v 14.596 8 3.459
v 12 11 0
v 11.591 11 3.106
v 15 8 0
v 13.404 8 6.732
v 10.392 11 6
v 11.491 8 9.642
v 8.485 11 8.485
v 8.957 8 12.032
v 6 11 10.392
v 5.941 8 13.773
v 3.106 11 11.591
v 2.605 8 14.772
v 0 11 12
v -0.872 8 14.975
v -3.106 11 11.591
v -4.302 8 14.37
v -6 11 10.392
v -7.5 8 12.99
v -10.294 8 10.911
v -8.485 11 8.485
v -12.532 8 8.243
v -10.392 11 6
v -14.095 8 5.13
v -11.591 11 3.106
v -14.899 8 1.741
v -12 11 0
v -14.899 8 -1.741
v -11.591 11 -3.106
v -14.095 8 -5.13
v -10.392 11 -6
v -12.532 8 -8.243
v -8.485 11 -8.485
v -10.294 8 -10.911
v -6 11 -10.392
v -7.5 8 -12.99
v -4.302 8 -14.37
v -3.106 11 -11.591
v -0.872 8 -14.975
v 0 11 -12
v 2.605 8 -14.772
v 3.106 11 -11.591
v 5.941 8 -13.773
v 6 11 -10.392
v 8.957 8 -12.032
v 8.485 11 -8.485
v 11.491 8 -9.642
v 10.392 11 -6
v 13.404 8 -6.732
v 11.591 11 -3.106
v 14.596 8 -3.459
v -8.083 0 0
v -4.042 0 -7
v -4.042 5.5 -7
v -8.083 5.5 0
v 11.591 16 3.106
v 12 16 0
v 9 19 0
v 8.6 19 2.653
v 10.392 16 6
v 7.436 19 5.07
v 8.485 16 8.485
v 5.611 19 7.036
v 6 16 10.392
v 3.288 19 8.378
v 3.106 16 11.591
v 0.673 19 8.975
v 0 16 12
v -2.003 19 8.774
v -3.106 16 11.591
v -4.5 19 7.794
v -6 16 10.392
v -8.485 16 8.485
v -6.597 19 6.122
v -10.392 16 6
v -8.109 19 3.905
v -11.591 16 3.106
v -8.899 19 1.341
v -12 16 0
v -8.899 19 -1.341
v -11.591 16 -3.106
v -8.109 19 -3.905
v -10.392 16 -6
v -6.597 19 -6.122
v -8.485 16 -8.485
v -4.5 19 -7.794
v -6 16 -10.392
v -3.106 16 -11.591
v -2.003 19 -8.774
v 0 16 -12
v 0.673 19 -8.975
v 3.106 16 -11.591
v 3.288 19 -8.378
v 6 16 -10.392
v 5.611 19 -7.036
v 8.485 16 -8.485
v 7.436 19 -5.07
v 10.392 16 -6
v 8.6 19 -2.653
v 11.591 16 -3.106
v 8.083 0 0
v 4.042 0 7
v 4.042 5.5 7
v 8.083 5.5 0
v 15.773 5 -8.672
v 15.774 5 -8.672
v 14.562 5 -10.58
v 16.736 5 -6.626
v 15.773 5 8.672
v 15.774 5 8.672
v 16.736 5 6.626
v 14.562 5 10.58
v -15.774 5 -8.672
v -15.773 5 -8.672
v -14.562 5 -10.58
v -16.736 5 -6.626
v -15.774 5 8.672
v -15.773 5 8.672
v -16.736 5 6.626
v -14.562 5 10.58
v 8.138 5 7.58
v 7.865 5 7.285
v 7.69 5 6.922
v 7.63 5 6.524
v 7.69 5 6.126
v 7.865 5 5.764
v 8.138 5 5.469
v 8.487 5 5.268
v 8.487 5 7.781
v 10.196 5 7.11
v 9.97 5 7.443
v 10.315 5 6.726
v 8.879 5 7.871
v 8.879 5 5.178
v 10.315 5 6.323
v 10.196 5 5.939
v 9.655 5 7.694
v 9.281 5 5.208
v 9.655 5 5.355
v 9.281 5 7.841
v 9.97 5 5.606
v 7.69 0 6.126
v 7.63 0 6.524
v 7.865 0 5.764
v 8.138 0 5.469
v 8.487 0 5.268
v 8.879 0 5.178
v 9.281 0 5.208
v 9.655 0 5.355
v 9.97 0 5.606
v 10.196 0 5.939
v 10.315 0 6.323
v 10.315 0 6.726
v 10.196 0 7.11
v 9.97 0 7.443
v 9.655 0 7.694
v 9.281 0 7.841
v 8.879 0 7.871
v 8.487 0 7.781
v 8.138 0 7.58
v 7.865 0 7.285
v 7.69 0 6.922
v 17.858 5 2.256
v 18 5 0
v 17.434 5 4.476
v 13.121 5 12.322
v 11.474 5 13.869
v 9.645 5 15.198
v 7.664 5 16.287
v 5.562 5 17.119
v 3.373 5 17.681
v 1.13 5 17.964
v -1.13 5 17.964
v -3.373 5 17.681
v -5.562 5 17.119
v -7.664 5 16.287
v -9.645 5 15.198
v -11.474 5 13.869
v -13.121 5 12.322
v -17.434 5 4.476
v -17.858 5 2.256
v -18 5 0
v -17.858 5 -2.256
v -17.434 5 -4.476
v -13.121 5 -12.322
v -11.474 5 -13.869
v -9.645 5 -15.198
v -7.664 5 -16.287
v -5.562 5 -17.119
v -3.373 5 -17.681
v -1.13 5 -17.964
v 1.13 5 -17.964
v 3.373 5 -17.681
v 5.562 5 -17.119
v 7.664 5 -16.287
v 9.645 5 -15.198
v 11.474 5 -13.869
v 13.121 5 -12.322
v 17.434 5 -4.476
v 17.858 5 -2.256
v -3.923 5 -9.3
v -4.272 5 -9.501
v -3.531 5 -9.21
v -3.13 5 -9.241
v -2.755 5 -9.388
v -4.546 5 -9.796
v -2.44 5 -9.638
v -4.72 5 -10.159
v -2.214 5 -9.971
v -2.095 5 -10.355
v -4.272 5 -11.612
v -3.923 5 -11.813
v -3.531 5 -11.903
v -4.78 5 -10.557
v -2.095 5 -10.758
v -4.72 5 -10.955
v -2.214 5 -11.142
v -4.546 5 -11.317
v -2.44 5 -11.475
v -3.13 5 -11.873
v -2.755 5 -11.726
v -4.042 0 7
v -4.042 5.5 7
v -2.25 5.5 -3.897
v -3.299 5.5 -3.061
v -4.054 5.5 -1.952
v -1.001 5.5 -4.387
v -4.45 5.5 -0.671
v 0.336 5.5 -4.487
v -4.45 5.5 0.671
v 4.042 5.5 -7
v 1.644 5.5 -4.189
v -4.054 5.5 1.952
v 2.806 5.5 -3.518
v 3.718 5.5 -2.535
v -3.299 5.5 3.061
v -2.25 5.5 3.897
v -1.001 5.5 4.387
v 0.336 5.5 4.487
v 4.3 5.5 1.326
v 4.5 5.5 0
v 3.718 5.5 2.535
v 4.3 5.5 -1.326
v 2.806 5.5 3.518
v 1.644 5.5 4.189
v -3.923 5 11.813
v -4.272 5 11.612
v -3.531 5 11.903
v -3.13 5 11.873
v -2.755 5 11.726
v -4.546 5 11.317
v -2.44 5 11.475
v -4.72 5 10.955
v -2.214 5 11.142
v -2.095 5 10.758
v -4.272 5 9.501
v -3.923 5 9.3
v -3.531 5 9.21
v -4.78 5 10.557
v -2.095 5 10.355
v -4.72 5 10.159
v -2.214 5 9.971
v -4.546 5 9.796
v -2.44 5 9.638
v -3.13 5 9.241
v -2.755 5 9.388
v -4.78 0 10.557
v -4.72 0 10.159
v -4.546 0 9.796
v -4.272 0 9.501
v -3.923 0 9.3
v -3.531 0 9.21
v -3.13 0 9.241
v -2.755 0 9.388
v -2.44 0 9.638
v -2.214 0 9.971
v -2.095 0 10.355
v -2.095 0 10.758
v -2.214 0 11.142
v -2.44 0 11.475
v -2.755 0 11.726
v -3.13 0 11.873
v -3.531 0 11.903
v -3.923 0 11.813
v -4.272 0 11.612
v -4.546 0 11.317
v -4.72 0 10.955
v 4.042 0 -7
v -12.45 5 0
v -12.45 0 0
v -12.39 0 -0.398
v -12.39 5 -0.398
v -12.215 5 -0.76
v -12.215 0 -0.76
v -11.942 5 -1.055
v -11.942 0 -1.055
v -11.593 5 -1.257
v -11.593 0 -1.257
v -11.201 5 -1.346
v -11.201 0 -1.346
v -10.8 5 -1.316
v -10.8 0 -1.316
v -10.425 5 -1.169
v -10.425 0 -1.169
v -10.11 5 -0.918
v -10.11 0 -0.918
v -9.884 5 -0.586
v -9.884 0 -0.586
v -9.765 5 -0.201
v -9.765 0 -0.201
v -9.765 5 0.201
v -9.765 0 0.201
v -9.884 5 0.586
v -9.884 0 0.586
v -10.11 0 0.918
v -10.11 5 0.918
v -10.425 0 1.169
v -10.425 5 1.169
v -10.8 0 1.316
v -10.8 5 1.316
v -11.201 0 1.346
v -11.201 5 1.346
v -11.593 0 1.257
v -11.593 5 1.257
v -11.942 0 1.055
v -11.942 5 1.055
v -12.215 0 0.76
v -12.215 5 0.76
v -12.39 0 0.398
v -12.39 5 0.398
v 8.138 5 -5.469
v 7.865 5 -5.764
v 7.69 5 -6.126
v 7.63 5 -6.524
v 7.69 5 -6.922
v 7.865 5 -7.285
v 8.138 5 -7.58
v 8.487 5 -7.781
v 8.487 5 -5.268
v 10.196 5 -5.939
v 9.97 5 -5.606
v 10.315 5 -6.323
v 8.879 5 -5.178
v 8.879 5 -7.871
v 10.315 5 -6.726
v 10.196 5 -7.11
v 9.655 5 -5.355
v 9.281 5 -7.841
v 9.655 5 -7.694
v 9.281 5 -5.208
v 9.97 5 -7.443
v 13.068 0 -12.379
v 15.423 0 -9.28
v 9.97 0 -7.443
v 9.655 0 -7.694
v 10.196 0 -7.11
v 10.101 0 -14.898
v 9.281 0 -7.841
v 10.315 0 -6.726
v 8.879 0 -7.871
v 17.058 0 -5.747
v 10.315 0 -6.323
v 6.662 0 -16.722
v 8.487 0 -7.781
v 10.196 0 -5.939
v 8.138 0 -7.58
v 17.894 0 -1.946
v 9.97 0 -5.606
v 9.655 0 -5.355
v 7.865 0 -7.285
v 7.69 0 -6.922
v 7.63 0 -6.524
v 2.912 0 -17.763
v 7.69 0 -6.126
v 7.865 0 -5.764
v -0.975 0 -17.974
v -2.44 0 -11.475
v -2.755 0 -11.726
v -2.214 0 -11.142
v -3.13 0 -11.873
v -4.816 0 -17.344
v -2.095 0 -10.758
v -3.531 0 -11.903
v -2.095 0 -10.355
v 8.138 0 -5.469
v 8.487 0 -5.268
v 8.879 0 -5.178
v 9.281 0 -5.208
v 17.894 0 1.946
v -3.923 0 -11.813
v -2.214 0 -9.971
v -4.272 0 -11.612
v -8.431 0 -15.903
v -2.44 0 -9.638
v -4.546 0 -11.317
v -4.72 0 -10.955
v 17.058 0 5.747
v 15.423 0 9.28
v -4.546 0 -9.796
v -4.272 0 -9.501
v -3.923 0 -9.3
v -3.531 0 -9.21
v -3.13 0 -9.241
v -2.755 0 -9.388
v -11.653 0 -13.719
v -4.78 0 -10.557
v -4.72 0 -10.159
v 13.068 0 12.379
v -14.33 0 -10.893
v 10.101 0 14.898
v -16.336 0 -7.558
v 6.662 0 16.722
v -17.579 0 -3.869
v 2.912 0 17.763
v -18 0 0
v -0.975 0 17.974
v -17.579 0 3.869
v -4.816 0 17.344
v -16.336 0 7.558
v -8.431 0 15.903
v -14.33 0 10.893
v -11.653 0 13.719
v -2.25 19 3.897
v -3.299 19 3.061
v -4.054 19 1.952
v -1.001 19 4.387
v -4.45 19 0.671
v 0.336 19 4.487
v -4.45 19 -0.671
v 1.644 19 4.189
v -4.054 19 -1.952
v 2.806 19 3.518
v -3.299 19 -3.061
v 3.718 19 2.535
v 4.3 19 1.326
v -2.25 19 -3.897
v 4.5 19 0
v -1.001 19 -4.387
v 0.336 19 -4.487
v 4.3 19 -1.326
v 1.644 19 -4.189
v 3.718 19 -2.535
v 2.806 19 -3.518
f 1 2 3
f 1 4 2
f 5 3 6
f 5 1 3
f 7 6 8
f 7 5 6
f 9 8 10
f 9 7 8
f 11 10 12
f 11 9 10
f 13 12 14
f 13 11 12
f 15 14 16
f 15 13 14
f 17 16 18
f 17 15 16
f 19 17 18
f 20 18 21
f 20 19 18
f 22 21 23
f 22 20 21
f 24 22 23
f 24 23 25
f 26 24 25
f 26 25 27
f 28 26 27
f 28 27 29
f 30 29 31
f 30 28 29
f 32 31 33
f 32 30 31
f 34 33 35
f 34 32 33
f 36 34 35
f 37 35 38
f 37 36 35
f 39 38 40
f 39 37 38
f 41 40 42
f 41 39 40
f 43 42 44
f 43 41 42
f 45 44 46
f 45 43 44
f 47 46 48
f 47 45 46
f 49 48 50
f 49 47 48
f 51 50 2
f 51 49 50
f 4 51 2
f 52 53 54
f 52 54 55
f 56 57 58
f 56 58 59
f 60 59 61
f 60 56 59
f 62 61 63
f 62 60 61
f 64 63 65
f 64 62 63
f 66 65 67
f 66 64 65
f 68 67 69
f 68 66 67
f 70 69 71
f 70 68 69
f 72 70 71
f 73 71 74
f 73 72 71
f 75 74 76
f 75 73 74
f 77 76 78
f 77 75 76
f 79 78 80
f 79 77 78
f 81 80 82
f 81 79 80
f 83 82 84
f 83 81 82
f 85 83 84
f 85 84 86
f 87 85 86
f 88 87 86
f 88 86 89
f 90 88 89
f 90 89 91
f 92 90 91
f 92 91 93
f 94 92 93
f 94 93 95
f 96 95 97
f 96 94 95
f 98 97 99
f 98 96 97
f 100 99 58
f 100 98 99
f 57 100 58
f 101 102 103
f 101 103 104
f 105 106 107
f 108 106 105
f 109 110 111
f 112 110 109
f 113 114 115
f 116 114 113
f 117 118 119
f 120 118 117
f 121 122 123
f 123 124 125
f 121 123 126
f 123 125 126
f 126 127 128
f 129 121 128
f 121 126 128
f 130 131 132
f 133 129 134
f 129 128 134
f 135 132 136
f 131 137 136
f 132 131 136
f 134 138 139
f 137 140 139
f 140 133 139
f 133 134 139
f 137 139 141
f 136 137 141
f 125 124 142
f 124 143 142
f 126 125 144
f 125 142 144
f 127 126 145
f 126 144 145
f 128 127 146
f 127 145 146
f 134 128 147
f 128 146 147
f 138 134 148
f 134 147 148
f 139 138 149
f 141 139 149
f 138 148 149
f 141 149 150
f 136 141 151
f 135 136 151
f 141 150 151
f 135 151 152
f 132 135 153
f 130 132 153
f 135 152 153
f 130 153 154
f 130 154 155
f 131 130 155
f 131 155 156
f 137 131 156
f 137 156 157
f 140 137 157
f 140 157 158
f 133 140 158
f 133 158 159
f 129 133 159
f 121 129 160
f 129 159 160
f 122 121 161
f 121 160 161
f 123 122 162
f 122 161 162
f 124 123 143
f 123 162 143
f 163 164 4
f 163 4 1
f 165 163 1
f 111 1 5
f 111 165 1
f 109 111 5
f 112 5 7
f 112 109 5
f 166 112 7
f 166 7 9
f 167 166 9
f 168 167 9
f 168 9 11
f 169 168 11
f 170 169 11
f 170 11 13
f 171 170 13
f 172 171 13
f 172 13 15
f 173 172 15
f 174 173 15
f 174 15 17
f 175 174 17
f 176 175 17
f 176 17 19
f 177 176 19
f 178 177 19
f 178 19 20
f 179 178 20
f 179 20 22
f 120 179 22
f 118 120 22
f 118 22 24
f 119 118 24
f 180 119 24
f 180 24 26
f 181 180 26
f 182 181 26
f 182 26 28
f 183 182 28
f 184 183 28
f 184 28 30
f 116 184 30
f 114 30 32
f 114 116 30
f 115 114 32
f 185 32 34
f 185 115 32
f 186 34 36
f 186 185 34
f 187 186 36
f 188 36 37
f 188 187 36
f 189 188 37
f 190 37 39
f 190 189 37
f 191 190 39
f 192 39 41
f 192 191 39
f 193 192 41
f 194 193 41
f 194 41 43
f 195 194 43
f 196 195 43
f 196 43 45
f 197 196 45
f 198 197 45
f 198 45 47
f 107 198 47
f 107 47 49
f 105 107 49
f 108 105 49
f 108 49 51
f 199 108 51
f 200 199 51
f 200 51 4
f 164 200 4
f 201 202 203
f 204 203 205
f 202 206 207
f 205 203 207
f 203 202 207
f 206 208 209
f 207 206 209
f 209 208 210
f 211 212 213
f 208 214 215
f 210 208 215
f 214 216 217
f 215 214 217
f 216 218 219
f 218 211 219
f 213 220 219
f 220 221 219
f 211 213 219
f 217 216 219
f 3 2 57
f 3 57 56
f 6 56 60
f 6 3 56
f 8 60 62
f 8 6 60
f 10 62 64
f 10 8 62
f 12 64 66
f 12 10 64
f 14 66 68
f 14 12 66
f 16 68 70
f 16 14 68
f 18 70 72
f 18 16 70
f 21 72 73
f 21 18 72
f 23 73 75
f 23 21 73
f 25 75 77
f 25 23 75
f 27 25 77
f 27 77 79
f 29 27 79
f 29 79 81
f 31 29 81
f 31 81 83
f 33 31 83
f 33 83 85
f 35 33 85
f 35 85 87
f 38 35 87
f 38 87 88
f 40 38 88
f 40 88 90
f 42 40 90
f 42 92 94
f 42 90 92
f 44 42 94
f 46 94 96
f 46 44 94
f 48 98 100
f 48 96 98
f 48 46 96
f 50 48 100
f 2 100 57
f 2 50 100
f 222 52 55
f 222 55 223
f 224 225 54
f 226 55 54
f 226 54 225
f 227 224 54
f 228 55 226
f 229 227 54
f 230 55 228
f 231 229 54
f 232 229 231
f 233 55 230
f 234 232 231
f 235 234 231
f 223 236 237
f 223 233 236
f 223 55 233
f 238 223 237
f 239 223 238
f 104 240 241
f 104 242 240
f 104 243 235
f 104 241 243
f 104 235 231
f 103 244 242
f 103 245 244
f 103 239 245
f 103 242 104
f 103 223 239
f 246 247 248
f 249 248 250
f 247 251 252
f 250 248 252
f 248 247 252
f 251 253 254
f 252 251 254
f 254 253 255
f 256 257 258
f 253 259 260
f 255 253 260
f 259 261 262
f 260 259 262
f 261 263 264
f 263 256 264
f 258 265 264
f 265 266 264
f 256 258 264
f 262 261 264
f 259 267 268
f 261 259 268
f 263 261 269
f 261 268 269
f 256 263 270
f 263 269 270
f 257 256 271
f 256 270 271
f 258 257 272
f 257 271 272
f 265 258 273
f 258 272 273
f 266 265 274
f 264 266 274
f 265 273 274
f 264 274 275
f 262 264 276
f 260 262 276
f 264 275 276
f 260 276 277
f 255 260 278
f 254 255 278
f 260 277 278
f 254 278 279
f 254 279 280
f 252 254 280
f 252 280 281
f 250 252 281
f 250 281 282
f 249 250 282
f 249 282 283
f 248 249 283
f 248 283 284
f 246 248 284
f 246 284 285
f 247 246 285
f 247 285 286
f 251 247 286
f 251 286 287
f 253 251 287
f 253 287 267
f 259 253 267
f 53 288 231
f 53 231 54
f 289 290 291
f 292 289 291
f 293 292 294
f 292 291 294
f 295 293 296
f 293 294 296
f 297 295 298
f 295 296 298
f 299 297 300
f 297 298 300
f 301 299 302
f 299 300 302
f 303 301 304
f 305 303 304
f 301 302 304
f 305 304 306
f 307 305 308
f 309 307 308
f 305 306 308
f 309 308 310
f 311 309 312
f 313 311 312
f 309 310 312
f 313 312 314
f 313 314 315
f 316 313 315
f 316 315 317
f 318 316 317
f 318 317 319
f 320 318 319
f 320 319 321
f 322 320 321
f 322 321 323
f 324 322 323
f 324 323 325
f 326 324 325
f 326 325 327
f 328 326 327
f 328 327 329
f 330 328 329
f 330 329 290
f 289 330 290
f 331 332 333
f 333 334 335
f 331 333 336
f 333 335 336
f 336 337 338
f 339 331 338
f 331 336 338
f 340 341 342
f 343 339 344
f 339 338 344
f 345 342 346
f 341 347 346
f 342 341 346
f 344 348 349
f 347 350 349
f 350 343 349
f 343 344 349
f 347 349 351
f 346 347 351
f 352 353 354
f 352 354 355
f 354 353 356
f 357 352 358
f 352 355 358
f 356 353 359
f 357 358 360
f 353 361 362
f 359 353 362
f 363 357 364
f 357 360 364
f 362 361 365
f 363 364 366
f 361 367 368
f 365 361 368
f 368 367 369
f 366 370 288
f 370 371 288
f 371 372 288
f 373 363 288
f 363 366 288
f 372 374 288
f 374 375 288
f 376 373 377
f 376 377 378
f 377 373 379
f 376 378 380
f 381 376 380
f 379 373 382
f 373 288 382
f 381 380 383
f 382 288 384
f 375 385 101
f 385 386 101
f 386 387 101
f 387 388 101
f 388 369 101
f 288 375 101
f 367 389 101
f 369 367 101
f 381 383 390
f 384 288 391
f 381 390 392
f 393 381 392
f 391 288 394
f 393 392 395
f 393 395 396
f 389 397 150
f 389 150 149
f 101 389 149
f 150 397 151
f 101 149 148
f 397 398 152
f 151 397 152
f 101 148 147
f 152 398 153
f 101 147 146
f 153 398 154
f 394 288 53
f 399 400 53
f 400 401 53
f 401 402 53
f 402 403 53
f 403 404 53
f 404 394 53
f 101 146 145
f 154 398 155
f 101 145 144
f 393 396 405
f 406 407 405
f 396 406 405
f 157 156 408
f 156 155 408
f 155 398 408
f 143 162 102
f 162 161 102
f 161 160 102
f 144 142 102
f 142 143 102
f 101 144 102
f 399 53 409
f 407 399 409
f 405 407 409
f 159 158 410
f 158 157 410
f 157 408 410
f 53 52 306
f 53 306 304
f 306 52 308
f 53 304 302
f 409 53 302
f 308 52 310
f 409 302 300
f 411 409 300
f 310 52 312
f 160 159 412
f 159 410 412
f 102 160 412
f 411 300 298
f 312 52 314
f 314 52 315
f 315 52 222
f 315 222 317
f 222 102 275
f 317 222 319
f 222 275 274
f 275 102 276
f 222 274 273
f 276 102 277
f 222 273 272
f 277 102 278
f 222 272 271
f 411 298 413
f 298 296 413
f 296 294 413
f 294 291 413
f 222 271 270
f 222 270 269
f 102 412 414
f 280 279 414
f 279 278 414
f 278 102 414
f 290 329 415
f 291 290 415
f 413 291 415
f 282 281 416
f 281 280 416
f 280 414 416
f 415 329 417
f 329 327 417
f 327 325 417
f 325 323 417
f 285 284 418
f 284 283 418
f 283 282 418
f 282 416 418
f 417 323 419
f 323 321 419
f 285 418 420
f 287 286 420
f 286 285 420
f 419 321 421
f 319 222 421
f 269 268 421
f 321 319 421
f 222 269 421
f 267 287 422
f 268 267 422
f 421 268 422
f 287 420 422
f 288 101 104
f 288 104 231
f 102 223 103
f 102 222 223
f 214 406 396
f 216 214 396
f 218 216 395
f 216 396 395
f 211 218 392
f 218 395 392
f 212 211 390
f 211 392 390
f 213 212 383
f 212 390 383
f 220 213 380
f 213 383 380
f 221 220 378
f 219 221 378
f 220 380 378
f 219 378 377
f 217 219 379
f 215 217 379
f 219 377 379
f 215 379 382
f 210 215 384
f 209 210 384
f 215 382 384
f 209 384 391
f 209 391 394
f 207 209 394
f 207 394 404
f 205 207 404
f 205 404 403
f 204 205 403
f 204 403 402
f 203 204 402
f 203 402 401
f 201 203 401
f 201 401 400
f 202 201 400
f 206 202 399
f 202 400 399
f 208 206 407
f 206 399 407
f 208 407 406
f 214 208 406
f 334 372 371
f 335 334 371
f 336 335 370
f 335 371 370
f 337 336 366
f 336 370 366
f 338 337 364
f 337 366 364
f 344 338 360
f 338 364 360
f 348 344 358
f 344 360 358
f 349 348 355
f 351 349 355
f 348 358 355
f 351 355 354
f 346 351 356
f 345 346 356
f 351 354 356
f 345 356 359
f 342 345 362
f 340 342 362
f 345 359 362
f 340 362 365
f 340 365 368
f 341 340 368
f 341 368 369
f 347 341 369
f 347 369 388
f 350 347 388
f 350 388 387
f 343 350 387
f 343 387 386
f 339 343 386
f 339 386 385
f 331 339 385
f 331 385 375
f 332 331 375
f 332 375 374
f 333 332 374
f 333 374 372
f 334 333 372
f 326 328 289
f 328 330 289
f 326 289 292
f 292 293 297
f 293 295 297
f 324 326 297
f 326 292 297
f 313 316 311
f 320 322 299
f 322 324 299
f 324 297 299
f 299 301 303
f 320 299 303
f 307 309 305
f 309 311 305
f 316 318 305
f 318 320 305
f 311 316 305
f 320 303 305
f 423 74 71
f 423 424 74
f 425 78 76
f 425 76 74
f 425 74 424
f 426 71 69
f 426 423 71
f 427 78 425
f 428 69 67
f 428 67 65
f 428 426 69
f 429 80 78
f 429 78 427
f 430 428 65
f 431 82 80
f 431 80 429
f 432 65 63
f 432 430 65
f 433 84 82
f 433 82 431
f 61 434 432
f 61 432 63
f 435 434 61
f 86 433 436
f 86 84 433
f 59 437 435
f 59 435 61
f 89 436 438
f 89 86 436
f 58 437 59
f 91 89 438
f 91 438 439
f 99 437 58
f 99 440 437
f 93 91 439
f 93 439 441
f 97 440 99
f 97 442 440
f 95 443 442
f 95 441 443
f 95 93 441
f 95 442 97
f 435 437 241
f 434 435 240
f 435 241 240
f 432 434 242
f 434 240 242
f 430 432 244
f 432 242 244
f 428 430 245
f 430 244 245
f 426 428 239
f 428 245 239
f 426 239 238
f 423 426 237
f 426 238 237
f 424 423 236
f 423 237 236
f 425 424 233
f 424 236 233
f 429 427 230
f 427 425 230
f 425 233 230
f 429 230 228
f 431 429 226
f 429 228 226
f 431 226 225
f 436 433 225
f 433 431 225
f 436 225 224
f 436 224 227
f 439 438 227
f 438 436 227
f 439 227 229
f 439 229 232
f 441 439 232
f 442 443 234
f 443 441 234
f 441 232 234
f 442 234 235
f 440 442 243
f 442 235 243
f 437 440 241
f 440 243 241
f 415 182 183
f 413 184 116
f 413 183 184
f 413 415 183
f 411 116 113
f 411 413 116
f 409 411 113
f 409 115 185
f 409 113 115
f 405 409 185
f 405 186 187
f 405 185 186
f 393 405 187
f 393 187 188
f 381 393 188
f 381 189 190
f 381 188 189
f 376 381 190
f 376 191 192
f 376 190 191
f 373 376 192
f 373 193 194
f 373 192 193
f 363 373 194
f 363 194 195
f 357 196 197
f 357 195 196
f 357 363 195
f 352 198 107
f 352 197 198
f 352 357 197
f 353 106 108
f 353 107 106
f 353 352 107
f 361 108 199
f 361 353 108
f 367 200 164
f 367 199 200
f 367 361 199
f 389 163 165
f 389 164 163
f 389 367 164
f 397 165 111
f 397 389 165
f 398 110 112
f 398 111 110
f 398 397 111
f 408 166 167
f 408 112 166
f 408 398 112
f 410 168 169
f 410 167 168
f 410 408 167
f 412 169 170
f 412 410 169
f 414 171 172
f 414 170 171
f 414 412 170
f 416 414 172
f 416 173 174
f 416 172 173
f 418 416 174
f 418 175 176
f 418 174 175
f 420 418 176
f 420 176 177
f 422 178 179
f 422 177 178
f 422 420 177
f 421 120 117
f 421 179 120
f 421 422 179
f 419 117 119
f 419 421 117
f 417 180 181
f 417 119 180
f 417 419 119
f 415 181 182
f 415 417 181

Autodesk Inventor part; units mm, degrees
ref_plane "YZ Plane" through (0, 0, 0) normal (1, 0, 0) x (0, 1, 0)
ref_plane "XZ Plane" through (0, 0, 0) normal (0, 1, 0) x (-1, 0, 0)
ref_plane "XY Plane" through (0, 0, 0) normal (0, 0, 1) x (1, 0, 0)
sketch "Sketch1" plane through (0, 0, 0) normal (0, 1, 0) x (-1, 0, 0)
  circle A0 centre (0, 0) radius 18
  line L0 (10.3065, -1.0922) -> (4.2236, -9.4646)
  line L1 (2.1462, -10.1396) -> (-7.6962, -6.9416)
  line L2 (-8.9801, -5.1744) -> (-8.9801, 5.1744)
  line L3 (-7.6962, 6.9416) -> (2.1462, 10.1396)
  line L4 (4.2236, 9.4646) -> (10.3065, 1.0922)
  circle A1 centre (3.4301, 10.5567) radius 1.35
  circle A2 centre (11.1, 0) radius 1.35
  circle A3 centre (-8.9801, 6.5244) radius 1.35
  circle A4 centre (-8.9801, -6.5244) radius 1.35
  circle A5 centre (3.4301, -10.5567) radius 1.35
  arc A6 (11.0179, 1.3475) -> (4.6863, 10.0622) centre (0, 0) ccw
  arc A7 (4.6863, -10.0622) -> (11.0179, -1.3475) centre (0, 0) ccw
  arc A8 (-8.1216, -7.5663) -> (2.1232, -10.8951) centre (0, 0) ccw
  arc A9 (2.1232, 10.8951) -> (-8.1216, 7.5663) centre (0, 0) ccw
  arc A10 (-9.7057, 5.386) -> (-9.7057, -5.386) centre (0, 0) ccw
  dimension "d0" = 36
  dimension "d2" = 2.7
  dimension "d3" = 2.7
  dimension "d4" = 2.7
  dimension "d5" = 2.7
  dimension "d6" = 2.7
extrude "Extrusion1" add sketch "Sketch1" along normal blind 5 contours A0 | A2 A7 A5 L0 | L0 A5 L1 A4 L2 A3 L3 A1 L4 A2 | L4 A1 A6 A2 | A5 A8 A4 L1 | L3 A3 A9 A1 | A10 A3 L2 A4
sketch "Sketch2" plane through (0, 5, 0) normal (0, 1, 0) x (1, 0, 0)
  circle A0 centre (0, 0) radius 18 projected
  circle A1 centre (0, 0) radius 15
  point P0 (2.5, -14.7902)
  point P1 (2.5, 14.7902)
  dimension "d9" = 30
extrude "Extrusion2" add sketch "Sketch2" along normal blind 6 contours A1
sketch "Sketch3" plane through (0, 0, 0) normal (0, -1, 0) x (1, 0, 0)
  circle A0 centre (0, 0) radius 18 projected
  line L0 (-8.0829, 0) -> (-4.0415, 7)
  line L1 (-4.0415, 7) -> (4.0415, 7)
  line L2 (4.0415, 7) -> (8.0829, 0)
  line L3 (8.0829, 0) -> (4.0415, -7)
  line L4 (4.0415, -7) -> (-4.0415, -7)
  line L5 (-4.0415, -7) -> (-8.0829, 0)
  dimension "d23" = 14
extrude "Extrusion3" cut sketch "Sketch3" against normal blind 5.5 contours L0 L1 L2 L3 L4 L5
sketch "Sketch4" plane through (0, 5.5, 0) normal (0, -1, 0) x (1, 0, 0)
  circle A0 centre (0, 0) radius 4.5
  dimension "d26" = 9
extrude "Extrusion4" cut sketch "Sketch4" against normal blind 9
chamfer "Chamfer1" distance 3 angle 45 2 edges at (-15, 5, 0) (-15, 11, 0)
sketch "Sketch5" plane through (0, 11, 0) normal (0, 1, 0) x (1, 0, 0)
  circle A0 centre (0, 0) radius 4.5 projected
  circle A1 centre (0, 0) radius 12 projected
extrude "Extrusion5" add sketch "Sketch5" along normal blind 8
chamfer "Chamfer2" distance 3 angle 45 1 edges at (-12, 19, 0)
equation "\"BendRadius\" = Thickness"
equation "\"BendReliefWidth\" = Thickness"
equation "\"BendReliefDepth\" = 0.5 * Thickness"
equation "\"CornerReliefSize\" = 4 * Thickness"
equation "\"MinimumRemnant\" = 2 * Thickness"
equation "\"TransitionRadius\" = BendRadius"
equation "\"JacobiRadiusSize\" = BendRadius"
equation "\"GapSize\" = Thickness"
equation "\"Thickness\" = 0.5"
properties part number "motorSupportNew1 modified2"
